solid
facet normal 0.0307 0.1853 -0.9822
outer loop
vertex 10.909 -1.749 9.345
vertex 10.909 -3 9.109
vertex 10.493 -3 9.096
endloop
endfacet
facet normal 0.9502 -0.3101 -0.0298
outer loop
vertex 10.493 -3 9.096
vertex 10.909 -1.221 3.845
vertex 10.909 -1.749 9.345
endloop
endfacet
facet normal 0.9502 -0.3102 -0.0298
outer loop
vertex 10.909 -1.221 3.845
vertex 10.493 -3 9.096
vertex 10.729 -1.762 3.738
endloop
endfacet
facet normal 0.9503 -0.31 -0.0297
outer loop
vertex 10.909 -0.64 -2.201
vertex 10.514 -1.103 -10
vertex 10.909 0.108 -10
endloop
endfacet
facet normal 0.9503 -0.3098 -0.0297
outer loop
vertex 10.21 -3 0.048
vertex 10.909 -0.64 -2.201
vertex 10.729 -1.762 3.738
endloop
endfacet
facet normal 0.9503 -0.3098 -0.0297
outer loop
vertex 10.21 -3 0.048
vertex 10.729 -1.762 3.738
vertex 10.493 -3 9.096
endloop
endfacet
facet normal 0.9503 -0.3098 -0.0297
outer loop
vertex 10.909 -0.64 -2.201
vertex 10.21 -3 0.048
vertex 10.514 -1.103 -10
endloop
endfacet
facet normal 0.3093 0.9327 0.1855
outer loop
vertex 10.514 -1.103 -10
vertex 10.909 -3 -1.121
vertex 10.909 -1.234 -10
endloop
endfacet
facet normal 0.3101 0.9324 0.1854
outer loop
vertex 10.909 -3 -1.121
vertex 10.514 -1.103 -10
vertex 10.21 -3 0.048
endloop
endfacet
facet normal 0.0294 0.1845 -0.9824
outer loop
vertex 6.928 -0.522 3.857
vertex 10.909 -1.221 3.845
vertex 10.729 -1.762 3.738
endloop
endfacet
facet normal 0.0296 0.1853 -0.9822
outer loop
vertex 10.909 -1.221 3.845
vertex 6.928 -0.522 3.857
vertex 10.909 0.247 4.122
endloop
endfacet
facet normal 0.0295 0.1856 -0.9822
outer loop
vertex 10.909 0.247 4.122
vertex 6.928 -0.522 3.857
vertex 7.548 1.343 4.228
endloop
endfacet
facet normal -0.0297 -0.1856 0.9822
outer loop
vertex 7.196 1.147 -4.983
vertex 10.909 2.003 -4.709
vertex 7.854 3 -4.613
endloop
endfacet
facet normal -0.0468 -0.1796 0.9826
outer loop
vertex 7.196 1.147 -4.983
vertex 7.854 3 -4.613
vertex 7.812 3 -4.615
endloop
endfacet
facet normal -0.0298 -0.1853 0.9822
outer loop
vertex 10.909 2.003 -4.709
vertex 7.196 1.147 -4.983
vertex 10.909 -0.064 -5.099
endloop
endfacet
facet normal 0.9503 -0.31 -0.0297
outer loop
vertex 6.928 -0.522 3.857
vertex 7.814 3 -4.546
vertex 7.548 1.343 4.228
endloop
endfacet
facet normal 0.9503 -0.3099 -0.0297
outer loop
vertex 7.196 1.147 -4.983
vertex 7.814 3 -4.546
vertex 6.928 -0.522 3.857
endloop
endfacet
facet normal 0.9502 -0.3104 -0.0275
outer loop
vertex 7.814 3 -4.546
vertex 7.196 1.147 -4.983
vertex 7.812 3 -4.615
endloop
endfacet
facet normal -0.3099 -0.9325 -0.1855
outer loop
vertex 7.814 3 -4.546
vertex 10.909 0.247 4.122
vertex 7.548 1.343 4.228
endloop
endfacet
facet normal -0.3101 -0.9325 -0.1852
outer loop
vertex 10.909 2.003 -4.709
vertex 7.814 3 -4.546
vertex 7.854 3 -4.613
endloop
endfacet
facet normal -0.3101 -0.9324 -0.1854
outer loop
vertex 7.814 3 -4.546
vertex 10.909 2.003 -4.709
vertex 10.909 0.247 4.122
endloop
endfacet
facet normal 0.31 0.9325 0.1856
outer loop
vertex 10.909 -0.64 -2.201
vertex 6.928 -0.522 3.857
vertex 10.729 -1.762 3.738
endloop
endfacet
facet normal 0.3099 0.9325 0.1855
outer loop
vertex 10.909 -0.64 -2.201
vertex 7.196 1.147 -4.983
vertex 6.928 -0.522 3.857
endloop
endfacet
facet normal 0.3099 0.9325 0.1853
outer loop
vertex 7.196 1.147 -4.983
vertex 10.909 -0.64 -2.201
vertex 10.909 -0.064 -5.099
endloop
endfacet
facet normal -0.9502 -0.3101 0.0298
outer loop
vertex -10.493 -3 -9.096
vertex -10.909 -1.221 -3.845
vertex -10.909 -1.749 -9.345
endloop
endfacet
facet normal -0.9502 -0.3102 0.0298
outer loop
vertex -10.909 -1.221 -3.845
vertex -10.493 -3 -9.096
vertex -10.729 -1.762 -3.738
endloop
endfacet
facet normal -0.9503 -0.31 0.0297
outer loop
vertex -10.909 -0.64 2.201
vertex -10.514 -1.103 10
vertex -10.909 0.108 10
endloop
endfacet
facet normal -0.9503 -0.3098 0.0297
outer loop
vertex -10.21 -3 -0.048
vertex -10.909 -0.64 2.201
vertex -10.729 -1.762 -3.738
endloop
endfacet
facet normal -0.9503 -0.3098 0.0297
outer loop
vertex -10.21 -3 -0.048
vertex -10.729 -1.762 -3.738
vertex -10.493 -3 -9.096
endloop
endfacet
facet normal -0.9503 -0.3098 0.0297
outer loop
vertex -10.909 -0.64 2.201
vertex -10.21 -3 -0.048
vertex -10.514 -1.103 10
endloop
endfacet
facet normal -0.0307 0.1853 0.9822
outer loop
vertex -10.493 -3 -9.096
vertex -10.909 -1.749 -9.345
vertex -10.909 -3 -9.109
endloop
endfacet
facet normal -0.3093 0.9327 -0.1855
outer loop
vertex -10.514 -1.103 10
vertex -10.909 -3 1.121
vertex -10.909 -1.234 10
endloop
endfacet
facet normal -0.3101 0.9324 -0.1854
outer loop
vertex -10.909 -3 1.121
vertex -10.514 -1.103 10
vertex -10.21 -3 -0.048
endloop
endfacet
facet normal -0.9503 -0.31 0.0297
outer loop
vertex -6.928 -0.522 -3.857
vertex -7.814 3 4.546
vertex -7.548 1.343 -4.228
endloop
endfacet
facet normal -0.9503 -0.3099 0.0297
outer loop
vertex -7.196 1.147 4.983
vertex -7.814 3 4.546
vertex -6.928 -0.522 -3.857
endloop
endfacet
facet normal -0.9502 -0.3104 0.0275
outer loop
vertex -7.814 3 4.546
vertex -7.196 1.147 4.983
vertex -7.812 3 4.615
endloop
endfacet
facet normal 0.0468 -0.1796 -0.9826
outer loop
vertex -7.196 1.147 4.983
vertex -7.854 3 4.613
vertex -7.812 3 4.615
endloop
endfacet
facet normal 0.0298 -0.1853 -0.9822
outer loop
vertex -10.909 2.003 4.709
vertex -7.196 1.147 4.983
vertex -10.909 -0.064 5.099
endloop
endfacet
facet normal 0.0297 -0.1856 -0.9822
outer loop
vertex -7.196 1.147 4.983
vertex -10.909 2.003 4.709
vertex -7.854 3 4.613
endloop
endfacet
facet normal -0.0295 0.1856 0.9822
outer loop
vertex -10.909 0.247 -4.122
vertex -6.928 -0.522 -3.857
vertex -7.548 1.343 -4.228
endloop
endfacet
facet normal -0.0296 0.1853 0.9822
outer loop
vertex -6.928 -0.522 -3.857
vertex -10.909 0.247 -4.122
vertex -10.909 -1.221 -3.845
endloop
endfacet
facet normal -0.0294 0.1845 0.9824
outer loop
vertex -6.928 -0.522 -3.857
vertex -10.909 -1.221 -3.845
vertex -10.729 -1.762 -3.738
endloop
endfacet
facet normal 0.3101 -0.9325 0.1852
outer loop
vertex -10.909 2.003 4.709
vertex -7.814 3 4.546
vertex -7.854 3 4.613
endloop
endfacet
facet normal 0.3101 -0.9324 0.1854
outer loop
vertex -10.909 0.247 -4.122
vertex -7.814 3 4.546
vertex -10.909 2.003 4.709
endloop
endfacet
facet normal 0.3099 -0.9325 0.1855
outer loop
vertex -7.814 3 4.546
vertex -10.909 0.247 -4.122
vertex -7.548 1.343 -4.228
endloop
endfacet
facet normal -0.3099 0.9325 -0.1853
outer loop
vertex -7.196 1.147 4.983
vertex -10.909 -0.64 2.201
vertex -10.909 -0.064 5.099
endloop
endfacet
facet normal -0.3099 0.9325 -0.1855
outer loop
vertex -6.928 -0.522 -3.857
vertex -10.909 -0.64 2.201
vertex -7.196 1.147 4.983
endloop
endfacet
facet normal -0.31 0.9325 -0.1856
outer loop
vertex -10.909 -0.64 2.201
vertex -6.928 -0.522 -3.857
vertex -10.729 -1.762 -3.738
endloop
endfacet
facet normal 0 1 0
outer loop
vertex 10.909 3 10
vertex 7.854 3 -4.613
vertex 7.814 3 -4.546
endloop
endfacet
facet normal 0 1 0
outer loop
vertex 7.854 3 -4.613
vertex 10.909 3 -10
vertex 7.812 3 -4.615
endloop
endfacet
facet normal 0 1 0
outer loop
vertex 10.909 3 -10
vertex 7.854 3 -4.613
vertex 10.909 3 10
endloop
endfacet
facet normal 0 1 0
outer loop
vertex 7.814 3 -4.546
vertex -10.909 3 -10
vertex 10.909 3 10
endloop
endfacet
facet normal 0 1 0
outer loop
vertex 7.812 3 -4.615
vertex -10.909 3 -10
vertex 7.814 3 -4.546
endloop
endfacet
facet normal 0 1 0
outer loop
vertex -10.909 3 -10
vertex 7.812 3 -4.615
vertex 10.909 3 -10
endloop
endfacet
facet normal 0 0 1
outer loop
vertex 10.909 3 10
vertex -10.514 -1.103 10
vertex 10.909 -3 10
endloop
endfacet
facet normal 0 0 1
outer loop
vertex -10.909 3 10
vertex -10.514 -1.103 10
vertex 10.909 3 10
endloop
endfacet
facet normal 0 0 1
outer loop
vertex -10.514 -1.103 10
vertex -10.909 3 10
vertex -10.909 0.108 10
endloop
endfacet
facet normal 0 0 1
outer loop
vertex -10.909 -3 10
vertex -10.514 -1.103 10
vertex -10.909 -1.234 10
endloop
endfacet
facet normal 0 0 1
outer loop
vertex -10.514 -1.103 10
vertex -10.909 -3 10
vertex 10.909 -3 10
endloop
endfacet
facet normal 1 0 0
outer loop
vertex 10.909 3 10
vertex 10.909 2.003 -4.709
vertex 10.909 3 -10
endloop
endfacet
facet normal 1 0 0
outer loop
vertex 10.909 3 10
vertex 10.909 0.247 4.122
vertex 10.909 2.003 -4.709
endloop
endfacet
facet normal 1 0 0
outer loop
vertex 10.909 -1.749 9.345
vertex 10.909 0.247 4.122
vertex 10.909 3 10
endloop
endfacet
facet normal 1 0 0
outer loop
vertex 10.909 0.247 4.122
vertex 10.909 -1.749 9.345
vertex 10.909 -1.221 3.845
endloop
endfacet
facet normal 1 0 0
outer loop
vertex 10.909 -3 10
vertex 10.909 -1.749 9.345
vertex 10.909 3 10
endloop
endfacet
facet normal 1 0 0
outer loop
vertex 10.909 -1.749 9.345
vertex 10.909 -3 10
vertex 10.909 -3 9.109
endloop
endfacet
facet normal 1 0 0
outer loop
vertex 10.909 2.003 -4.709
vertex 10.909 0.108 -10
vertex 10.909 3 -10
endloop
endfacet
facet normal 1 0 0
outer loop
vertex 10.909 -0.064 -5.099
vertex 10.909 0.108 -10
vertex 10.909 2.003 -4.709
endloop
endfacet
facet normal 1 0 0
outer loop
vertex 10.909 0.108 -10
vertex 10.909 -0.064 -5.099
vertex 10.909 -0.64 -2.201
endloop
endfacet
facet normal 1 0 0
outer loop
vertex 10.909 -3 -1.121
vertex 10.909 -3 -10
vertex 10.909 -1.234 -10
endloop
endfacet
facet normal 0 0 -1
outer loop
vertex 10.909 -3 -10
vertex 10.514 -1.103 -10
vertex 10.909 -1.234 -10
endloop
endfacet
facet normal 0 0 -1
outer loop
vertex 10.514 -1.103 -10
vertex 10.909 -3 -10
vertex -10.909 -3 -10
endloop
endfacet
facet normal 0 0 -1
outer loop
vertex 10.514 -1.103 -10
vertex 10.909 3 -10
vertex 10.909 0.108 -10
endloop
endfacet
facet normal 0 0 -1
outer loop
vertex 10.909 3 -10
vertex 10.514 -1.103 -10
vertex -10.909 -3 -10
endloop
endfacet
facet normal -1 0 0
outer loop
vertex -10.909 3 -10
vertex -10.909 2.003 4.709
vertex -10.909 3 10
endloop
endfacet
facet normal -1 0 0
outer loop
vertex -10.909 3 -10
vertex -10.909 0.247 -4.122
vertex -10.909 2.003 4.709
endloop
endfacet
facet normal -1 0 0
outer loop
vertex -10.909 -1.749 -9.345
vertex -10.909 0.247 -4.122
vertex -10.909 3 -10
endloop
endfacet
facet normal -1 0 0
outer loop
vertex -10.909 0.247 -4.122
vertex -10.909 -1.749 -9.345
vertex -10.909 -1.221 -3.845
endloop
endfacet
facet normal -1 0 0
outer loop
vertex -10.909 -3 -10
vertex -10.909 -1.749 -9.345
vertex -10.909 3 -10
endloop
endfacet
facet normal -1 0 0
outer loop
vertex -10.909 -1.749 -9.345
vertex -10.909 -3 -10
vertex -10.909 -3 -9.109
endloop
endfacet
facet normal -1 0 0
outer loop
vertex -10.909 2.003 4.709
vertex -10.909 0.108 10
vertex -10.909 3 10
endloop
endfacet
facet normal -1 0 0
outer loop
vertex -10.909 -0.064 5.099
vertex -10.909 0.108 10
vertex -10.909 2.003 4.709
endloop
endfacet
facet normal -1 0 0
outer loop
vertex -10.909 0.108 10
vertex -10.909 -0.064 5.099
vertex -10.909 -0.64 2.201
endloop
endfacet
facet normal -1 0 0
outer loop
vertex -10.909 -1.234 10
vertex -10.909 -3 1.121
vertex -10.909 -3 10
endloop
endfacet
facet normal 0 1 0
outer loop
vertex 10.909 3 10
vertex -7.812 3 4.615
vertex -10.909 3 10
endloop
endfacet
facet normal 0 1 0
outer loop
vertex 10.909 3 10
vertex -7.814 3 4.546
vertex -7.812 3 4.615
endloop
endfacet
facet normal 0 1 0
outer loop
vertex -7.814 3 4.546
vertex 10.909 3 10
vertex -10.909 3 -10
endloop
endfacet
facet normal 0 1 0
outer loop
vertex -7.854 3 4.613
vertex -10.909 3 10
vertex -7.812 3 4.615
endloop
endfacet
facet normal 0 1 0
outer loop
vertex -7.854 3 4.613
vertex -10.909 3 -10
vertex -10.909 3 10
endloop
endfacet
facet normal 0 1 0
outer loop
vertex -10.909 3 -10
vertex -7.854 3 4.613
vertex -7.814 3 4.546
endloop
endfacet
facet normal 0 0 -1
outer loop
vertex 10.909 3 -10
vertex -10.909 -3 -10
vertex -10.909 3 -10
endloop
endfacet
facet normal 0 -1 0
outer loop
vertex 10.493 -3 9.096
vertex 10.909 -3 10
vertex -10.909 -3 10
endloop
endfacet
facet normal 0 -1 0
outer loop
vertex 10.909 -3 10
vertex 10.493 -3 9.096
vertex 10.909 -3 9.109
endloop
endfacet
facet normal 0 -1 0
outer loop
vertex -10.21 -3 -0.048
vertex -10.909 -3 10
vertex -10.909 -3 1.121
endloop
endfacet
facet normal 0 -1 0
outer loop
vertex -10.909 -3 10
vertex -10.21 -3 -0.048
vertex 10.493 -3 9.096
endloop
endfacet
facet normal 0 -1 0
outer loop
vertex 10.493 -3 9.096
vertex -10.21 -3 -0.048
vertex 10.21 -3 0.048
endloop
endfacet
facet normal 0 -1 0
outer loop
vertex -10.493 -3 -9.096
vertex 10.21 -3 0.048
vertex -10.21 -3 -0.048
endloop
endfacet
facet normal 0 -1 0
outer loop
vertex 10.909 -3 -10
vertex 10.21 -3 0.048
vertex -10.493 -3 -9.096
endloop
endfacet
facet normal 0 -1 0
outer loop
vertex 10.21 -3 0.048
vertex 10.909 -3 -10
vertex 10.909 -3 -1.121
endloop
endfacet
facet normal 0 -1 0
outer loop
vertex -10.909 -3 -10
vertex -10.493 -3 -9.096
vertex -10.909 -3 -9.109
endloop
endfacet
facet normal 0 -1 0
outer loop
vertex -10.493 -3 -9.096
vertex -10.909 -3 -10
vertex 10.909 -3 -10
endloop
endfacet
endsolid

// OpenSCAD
difference(){
	rotate(a = [0, -30.8943255446, 0]) {
		rotate(a = [0, 0, 344.1176470588]) {
			translate(v = [13.6831495036, -48.0912821586, -58.8235294118]) {
				union() {
					translate(v = [-13.6831495036, 48.0912821586, 58.8235294118]) {
						rotate(a = [0, 30.8943255446, -344.1176470588]) {
							cube(center = true, size = [21.8185049322, 6, 20]);
						}
					}
				}
			}
		}
	}
	/* Holes Below*/
	rotate(a = [0, -30.8943255446, 0]){
		rotate(a = [0, 0, 344.1176470588]){
			translate(v = [13.6831495036, -48.0912821586, -58.8235294118]){
				union(){
					union() {
						translate(v = [4.6134179732, 49.7867088148, 47.0588235294]) {
							rotate(a = [0, 30.8943255446, -5.2941176471]) {
								union() {
									cube(center = true, size = [21.8185049322, 6, 20]);
									cube(center = true, size = [29.8185049322, 2, 9]);
								}
							}
						}
						translate(v = [0, 0, 47.0588235294]) {
							rotate(a = [0, 90, 84.7058823529]) {
								cylinder($fn = 32, center = true, h = 150, r = 5);
							}
						}
					}
					union() {
						translate(v = [-30.1317318190, 39.9008613640, 70.5882352941]) {
							rotate(a = [0, 30.8943255446, -322.9411764706]) {
								union() {
									cube(center = true, size = [21.8185049322, 6, 20]);
									cube(center = true, size = [29.8185049322, 2, 9]);
								}
							}
						}
						translate(v = [0, 0, 70.5882352941]) {
							rotate(a = [0, 90, -52.9411764706]) {
								cylinder($fn = 32, center = true, h = 150, r = 5);
							}
						}
					}
				}
			}
		}
	} /* End Holes */ 
}
